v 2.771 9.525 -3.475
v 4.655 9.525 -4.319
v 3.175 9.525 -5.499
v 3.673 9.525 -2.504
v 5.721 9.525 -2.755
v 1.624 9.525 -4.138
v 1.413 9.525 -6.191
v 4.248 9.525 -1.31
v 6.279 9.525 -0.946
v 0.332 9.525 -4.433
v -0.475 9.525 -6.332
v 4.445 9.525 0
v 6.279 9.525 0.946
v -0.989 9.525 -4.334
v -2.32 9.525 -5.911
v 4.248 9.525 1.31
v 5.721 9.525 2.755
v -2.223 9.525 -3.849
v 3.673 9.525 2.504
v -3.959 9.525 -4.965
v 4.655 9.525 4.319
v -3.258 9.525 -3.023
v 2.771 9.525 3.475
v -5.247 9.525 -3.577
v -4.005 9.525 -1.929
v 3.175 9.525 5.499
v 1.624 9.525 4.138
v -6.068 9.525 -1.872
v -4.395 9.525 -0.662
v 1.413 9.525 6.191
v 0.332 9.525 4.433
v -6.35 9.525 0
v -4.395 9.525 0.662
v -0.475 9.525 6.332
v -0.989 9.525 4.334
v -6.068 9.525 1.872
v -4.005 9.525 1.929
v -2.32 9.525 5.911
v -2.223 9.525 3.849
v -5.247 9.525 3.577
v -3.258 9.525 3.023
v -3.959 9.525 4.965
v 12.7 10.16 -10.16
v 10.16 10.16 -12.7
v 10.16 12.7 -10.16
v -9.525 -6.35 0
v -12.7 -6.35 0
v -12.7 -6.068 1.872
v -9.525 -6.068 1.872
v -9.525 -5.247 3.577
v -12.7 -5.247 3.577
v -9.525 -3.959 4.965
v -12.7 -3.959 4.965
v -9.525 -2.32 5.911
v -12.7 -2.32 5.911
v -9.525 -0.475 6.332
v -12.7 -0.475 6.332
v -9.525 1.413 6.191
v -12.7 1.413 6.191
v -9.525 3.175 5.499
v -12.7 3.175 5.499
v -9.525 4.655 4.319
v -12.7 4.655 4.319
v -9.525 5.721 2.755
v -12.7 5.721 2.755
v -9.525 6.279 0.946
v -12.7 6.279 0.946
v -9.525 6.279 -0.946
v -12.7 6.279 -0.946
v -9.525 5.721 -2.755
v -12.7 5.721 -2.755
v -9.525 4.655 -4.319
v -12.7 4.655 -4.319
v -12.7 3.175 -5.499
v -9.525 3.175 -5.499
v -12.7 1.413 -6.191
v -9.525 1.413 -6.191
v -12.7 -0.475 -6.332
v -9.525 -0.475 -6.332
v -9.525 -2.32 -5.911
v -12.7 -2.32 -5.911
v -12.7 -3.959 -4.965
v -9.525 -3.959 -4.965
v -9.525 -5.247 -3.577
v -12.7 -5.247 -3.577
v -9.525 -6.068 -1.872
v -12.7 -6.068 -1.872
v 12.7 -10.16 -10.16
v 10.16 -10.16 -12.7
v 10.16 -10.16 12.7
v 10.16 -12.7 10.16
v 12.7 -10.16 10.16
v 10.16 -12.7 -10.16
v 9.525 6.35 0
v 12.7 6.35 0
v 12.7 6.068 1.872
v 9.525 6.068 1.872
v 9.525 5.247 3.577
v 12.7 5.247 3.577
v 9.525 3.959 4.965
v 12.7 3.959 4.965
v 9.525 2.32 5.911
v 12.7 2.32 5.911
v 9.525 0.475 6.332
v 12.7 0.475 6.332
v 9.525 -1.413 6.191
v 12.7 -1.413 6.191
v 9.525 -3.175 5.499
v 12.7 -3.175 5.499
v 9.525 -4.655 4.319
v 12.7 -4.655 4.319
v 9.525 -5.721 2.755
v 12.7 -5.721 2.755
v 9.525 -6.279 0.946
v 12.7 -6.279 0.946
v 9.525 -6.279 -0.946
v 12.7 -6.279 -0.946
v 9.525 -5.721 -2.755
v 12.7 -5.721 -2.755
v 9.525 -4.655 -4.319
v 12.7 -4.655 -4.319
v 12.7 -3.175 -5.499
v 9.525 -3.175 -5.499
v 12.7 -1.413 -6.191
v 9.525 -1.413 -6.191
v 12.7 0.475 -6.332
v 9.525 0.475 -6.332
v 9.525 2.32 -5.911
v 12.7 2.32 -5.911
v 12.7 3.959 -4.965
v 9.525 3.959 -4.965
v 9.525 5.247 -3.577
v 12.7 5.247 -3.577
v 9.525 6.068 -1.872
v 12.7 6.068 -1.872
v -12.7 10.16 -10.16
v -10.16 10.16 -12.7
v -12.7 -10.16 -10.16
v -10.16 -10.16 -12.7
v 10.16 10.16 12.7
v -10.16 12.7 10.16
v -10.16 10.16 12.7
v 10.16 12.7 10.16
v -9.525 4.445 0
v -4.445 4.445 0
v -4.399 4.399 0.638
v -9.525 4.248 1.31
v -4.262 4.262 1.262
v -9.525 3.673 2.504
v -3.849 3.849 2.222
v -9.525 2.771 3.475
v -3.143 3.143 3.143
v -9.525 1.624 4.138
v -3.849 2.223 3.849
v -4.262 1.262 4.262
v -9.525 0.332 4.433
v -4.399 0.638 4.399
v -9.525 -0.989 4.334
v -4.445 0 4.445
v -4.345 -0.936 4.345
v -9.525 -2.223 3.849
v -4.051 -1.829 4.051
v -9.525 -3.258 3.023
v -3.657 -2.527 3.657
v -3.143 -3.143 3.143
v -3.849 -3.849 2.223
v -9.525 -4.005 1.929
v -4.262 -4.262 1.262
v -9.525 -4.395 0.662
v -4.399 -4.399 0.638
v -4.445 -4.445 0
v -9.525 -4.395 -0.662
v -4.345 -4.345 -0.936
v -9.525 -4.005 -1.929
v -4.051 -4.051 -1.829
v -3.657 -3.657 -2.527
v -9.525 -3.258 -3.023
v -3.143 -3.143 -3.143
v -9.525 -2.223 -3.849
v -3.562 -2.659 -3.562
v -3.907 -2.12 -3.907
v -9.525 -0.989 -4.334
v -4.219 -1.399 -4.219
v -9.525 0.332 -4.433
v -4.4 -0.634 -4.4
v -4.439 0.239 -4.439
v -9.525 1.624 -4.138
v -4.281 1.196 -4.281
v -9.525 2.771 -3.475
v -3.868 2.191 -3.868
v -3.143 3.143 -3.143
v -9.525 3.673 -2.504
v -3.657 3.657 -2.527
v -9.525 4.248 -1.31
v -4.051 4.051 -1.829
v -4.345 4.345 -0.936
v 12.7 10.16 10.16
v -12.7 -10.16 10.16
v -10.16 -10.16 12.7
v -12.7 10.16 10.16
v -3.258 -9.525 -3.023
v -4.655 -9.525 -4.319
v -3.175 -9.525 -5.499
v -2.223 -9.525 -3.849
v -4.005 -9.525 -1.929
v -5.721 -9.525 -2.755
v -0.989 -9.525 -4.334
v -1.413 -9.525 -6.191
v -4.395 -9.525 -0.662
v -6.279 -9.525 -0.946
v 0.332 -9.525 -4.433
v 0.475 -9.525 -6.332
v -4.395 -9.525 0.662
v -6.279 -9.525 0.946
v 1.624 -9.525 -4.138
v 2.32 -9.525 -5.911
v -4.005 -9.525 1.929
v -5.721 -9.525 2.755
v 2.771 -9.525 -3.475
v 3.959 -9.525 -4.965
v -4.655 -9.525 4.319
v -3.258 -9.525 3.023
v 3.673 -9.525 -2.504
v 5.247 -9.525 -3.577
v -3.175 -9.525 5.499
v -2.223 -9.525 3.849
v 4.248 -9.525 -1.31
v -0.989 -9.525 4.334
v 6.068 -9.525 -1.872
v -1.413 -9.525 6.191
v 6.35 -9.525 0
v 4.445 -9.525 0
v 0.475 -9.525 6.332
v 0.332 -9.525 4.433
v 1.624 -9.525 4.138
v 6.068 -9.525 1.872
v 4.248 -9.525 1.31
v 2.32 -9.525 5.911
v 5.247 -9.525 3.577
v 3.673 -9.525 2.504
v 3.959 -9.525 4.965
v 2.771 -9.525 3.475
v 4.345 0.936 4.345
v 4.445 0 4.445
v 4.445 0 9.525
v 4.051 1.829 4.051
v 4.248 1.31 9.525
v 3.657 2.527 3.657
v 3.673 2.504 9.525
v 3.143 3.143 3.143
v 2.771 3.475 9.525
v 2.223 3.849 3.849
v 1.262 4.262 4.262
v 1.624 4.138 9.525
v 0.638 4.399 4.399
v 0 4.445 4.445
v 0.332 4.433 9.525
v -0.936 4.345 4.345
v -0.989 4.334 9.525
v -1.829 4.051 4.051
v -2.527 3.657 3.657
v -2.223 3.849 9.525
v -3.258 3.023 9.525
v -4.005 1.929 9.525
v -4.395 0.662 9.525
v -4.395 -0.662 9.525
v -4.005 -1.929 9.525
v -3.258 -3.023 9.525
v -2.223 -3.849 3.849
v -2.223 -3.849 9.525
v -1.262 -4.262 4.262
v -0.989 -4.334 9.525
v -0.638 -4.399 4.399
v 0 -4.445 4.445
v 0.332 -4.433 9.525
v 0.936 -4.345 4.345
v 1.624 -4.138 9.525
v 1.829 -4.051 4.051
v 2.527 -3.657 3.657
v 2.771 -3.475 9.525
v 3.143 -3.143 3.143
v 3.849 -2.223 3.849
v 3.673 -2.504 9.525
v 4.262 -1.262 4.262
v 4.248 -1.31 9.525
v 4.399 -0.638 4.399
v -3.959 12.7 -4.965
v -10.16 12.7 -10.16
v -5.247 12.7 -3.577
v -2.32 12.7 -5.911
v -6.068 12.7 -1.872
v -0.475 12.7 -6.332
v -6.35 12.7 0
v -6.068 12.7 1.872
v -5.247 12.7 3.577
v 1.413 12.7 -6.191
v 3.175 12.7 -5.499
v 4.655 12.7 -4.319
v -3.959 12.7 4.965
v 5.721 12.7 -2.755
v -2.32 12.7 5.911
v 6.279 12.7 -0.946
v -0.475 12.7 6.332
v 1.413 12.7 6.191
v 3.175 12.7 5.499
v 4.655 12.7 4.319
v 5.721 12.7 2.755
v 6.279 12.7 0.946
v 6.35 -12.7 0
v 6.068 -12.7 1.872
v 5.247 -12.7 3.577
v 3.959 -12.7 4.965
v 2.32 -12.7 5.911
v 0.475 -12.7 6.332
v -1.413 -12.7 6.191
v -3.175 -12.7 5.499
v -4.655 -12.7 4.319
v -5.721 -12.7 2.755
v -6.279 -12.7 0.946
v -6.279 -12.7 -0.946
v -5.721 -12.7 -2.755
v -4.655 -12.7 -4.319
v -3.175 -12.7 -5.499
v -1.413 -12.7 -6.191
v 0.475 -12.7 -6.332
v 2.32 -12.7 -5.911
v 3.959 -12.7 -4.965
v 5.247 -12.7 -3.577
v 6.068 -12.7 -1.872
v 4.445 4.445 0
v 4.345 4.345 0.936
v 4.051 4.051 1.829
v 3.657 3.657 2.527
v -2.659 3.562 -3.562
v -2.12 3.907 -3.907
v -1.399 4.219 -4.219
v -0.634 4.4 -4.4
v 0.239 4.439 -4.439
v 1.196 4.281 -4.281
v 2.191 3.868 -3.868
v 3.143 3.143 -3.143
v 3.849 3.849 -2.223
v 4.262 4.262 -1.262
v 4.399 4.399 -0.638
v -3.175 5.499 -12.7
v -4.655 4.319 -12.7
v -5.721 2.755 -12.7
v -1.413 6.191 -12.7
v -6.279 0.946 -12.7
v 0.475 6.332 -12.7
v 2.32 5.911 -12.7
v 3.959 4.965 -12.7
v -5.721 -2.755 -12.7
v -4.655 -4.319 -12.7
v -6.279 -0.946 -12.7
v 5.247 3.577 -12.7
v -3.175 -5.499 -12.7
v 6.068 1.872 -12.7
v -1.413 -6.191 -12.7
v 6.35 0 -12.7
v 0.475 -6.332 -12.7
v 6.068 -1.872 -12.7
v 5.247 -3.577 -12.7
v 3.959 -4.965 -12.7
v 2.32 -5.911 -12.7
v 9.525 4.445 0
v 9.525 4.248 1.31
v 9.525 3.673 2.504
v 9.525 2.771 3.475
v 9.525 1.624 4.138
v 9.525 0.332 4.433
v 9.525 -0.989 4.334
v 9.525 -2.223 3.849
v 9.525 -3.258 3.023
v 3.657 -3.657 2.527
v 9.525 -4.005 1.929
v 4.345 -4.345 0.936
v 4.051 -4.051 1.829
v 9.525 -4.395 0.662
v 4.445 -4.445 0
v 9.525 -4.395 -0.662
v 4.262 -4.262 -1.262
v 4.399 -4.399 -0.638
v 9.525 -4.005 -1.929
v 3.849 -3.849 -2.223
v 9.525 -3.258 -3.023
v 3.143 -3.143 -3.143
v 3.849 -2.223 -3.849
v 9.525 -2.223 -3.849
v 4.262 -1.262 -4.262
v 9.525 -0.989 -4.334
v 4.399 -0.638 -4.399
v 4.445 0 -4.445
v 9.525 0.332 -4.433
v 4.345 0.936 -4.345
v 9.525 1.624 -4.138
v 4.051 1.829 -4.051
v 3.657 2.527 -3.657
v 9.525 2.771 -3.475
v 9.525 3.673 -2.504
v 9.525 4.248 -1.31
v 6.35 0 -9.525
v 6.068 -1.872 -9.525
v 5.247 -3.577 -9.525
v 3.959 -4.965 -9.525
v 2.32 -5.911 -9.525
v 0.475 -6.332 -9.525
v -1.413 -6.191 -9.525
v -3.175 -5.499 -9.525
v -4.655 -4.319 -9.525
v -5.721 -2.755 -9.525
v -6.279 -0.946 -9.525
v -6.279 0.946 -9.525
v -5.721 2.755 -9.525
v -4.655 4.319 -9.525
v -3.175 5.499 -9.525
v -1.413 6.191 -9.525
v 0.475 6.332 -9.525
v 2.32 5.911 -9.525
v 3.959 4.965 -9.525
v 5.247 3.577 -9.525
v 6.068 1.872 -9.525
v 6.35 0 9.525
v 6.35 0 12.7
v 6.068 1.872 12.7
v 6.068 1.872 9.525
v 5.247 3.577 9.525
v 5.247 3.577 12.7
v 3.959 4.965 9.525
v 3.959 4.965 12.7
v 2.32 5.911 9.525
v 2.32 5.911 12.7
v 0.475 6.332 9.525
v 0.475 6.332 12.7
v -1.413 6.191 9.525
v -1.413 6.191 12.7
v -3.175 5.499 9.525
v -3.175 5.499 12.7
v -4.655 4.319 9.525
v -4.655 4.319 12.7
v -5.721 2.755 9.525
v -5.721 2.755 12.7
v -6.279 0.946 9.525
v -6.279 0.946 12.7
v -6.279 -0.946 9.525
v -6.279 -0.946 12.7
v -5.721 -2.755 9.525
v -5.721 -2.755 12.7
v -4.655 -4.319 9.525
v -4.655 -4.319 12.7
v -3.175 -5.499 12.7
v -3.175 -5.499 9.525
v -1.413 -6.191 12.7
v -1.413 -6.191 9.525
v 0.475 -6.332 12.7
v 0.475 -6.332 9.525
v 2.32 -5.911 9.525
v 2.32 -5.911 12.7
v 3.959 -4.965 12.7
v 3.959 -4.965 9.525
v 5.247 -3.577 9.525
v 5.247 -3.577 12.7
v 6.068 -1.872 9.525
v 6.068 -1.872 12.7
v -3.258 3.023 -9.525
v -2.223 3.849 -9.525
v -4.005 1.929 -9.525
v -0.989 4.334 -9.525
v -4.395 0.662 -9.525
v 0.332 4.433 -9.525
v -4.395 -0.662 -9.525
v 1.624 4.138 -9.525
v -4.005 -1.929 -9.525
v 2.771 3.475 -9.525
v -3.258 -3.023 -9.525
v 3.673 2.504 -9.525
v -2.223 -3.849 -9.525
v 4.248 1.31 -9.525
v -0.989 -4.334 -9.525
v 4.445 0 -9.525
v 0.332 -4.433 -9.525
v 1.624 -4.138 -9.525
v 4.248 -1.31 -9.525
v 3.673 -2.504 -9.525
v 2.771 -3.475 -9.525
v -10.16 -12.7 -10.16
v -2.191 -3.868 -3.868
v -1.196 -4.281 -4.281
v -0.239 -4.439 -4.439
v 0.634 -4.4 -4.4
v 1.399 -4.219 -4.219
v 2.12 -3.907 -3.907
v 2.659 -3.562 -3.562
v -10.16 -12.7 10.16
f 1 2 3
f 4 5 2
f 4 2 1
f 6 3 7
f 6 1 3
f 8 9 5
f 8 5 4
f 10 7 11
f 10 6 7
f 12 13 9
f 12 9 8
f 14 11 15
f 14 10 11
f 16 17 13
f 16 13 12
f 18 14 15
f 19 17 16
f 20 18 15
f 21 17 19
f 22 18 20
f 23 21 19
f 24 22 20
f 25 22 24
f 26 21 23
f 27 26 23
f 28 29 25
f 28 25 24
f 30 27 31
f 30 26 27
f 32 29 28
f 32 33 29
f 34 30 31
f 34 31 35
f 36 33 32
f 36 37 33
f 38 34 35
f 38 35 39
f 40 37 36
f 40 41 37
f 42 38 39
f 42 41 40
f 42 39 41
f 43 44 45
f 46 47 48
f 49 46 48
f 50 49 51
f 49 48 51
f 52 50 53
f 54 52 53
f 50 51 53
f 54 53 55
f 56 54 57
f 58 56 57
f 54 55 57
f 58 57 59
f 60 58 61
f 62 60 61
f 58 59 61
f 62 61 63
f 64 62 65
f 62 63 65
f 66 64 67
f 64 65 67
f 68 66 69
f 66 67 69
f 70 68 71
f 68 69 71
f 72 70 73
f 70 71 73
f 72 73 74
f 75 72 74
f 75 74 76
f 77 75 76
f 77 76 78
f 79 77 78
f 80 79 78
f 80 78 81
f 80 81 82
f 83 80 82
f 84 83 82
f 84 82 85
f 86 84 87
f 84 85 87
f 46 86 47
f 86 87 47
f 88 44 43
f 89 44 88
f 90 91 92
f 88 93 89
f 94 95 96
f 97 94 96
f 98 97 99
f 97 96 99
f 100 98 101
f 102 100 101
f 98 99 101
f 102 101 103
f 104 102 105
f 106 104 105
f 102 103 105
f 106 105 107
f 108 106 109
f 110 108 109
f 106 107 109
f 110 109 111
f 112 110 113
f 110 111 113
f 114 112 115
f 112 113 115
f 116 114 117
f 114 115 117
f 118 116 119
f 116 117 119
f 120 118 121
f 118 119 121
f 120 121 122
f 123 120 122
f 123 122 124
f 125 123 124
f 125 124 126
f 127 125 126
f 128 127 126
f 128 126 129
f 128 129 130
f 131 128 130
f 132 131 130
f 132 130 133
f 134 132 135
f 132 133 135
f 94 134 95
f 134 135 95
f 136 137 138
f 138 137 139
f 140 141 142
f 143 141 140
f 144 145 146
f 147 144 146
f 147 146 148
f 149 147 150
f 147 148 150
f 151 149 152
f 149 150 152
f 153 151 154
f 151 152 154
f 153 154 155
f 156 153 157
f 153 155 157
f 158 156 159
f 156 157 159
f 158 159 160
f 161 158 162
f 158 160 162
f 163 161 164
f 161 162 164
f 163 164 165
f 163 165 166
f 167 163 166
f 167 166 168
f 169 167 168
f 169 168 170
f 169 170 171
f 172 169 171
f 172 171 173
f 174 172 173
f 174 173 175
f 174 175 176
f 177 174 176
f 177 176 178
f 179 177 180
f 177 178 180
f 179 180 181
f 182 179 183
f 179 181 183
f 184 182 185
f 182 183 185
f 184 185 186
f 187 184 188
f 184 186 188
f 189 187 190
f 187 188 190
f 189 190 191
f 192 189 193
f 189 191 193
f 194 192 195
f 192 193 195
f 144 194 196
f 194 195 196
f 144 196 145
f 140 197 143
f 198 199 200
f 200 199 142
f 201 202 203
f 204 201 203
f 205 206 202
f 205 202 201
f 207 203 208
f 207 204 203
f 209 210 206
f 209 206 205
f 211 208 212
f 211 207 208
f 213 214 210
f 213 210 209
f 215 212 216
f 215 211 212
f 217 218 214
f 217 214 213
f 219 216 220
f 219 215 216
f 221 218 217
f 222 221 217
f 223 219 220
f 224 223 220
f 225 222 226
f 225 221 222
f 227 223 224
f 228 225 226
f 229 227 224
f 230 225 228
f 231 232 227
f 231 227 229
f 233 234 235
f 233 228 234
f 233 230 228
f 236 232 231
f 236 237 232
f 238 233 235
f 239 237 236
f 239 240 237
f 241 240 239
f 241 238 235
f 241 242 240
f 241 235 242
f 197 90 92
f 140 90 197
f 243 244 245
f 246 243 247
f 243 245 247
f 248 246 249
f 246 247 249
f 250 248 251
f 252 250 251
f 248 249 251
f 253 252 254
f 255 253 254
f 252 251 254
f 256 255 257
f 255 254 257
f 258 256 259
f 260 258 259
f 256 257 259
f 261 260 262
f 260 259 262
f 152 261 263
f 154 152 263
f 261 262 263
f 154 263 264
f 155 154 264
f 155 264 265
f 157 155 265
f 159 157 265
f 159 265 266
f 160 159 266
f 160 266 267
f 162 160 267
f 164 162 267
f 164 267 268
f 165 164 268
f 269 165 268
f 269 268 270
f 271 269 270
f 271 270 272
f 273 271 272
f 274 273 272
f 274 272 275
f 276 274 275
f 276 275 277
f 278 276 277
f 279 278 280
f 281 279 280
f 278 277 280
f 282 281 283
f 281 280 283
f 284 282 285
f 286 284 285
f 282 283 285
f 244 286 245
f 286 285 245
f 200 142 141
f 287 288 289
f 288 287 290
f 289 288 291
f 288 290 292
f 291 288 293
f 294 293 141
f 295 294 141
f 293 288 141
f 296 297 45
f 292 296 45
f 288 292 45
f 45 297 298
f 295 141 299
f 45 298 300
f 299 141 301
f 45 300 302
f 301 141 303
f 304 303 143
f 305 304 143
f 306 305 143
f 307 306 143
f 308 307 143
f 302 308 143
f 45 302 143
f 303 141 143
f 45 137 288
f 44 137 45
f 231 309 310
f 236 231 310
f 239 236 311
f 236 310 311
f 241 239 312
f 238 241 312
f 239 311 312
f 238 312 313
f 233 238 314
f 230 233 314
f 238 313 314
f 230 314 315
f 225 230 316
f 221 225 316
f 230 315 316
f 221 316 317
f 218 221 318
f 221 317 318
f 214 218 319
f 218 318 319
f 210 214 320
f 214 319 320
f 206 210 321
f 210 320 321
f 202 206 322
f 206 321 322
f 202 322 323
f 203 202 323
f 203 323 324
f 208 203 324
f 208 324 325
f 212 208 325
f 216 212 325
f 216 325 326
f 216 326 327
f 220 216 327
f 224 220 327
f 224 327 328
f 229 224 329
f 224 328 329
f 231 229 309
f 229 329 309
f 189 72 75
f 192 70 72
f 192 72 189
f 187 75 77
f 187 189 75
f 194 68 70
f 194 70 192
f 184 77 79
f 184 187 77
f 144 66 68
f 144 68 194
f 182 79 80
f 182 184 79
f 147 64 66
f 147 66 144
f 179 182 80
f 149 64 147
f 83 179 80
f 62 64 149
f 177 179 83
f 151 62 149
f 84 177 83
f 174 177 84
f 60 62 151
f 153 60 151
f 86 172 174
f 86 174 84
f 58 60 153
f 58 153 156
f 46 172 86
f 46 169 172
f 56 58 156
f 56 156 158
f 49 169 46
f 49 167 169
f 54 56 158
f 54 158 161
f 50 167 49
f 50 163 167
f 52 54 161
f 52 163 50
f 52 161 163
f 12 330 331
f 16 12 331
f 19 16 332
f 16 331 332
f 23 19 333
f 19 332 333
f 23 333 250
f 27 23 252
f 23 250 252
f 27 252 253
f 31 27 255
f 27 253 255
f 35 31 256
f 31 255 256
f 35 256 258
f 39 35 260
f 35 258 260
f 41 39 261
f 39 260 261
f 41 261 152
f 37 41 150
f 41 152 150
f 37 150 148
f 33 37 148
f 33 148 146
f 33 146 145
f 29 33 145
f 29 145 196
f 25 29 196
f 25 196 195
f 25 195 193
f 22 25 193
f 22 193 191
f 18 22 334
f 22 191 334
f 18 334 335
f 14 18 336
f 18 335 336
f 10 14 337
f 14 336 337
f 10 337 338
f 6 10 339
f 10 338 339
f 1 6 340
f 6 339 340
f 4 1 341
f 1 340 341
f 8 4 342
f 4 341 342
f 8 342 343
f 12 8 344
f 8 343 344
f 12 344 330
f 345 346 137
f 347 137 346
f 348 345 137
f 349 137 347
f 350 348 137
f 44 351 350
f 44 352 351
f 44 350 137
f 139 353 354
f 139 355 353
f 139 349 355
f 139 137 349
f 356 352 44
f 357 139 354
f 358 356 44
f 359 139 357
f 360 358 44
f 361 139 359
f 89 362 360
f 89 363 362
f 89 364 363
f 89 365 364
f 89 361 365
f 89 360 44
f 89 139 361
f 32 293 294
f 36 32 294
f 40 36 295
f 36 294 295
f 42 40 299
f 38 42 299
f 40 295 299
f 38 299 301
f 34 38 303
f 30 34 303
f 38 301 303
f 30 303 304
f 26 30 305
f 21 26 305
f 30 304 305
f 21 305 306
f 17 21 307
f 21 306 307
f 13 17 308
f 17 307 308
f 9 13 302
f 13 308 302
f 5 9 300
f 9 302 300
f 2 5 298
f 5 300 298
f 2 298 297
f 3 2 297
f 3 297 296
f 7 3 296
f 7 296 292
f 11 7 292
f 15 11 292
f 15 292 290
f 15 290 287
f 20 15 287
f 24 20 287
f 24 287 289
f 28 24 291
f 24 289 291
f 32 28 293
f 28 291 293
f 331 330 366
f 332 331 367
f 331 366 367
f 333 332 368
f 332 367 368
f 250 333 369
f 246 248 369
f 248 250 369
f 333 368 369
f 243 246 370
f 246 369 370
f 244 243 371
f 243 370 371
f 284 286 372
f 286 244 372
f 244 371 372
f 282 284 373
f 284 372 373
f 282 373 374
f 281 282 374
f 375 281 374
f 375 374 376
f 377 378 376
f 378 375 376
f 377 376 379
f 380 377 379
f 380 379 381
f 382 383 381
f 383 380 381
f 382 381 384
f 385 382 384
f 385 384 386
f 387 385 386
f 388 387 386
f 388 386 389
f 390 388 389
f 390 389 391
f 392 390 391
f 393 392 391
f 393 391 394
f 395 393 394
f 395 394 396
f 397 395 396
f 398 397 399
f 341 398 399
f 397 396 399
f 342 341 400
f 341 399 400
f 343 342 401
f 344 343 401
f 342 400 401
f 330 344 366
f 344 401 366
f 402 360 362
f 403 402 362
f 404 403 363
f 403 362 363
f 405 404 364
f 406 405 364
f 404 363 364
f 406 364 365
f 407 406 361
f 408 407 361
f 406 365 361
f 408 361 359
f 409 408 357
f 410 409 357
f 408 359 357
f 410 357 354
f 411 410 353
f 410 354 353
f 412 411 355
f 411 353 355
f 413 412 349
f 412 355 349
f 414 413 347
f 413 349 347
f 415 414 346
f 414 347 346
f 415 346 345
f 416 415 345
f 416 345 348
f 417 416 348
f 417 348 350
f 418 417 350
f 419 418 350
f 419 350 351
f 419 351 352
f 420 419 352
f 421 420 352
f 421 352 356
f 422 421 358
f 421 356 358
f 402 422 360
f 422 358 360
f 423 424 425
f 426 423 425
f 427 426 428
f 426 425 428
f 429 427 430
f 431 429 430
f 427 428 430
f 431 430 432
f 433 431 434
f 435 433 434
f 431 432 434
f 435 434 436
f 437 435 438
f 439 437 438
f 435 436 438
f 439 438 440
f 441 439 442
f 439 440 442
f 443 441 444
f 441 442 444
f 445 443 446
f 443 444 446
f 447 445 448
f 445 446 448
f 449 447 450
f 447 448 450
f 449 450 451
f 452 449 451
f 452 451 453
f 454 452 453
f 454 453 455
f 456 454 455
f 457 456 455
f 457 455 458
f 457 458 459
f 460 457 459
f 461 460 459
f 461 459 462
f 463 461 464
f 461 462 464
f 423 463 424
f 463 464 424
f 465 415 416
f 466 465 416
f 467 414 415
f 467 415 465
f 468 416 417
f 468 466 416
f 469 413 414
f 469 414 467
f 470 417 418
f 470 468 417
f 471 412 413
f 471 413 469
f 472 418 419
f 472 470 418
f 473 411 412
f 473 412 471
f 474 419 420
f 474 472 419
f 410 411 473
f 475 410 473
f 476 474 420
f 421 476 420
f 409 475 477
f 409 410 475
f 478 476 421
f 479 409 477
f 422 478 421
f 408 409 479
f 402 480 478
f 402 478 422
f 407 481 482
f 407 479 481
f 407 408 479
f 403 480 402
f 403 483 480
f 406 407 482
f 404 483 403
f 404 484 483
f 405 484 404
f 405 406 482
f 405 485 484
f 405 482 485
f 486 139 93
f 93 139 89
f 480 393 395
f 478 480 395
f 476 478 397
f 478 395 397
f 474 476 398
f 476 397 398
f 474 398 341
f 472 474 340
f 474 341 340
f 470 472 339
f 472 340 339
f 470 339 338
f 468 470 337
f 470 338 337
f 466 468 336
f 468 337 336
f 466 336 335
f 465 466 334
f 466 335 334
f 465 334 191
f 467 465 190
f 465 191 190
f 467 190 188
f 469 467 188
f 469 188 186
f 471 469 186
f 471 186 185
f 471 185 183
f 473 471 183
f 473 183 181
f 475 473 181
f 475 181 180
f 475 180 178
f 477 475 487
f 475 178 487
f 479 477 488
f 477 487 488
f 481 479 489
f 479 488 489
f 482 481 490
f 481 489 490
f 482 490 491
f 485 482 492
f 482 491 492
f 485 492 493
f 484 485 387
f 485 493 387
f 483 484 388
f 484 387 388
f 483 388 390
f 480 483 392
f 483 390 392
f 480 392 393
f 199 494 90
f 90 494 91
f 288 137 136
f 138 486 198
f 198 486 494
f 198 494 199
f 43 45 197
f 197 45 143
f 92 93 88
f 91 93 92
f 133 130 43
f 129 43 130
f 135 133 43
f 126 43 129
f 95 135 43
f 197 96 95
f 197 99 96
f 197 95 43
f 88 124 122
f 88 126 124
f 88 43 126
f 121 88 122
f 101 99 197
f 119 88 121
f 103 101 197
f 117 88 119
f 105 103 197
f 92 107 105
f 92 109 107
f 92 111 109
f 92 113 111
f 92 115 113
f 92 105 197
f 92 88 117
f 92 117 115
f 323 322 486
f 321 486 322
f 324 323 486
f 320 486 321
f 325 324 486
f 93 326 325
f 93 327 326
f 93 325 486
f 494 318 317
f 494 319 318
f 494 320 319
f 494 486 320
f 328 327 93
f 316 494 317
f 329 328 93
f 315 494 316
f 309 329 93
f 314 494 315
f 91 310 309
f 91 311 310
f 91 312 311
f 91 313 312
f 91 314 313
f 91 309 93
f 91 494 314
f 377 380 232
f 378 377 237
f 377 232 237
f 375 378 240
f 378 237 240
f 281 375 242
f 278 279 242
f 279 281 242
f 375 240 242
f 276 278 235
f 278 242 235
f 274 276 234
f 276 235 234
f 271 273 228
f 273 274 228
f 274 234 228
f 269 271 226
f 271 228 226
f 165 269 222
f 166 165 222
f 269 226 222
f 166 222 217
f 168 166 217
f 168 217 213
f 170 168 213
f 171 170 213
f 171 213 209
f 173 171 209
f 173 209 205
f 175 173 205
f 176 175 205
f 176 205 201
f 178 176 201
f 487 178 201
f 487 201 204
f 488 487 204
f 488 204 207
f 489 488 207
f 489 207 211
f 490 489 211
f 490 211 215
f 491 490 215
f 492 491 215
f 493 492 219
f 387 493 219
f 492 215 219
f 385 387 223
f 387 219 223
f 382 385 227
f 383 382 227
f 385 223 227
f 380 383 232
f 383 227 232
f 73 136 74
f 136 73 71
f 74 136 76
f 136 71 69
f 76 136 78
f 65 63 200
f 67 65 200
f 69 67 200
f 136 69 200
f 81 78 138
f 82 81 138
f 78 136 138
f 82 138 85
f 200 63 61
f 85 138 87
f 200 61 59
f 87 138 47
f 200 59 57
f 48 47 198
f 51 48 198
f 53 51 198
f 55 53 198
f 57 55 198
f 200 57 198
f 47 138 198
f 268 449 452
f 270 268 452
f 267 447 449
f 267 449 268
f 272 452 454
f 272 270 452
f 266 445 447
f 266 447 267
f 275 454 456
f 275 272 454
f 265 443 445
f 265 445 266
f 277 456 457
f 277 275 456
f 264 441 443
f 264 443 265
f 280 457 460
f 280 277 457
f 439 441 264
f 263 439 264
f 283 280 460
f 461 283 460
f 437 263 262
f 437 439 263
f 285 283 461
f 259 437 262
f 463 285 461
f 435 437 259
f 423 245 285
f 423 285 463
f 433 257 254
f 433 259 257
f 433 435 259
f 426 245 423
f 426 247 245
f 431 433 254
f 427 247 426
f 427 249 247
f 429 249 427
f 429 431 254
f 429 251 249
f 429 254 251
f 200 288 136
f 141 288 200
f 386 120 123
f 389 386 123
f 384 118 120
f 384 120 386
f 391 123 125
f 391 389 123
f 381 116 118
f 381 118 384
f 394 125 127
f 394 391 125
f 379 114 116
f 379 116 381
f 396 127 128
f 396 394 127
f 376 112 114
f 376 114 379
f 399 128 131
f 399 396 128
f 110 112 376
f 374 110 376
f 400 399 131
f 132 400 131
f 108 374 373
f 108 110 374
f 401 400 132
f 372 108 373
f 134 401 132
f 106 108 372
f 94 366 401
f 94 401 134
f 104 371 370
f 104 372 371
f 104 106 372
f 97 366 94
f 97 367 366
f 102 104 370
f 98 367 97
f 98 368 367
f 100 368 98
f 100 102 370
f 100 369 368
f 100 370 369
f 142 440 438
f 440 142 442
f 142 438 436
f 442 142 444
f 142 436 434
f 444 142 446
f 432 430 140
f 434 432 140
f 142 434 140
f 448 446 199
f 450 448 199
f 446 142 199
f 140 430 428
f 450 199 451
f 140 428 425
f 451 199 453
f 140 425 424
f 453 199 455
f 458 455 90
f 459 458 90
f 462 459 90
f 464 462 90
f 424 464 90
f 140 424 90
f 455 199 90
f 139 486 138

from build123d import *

# Parameters (mm, degrees)
F0_W          = 25.4
F0_H          = 25.4
F1_DEPTH      = 12.7
F1_DEPTH_BACK = 12.7
F2_R          = 4.445
F8_DEPTH      = 25.4
F4_R          = 4.445
F9_DEPTH      = 25.4
F6_R          = 4.445
F10_DEPTH     = 25.4
F2_R_2        = 6.35
F11_DEPTH     = 3.175
F3_R          = 6.35
F3_R_2        = 4.445
F12_DEPTH     = 3.175
F4_R_2        = 6.35
F13_DEPTH     = 3.175
F5_R          = 6.35
F5_R_2        = 4.445
F14_DEPTH     = 3.175
F6_R_2        = 6.35
F15_DEPTH     = 3.175
F7_R          = 6.35
F7_R_2        = 4.445
F16_DEPTH     = 3.175
F17_SIZE      = 2.54


with BuildPart() as f1:
    # F0 (on Front) → F1 (new body, two sides)
    with BuildSketch(Plane.XZ) as f1_sk:
        Rectangle(F0_W, F0_H)
    extrude(amount=F1_DEPTH)
    extrude(f1_sk.sketch, amount=-F1_DEPTH_BACK)

    # F2 (on face) → F8 (cut)
    with BuildSketch(Plane.XY.offset(12.7)):
        Circle(F2_R)
    extrude(amount=-F8_DEPTH, mode=Mode.SUBTRACT)

    # F4 (on face) → F9 (cut)
    with BuildSketch(Plane.XZ.offset(12.7)):
        Circle(F4_R)
    extrude(amount=-F9_DEPTH, mode=Mode.SUBTRACT)

    # F6 (on face) → F10 (cut)
    with BuildSketch(Plane.YZ.offset(12.7)):
        Circle(F6_R)
    extrude(amount=-F10_DEPTH, mode=Mode.SUBTRACT)

    # F2 (on face) → F11 (cut)
    with BuildSketch(Plane.XY.offset(12.7)):
        Circle(F2_R_2)
        Circle(F2_R, mode=Mode.SUBTRACT)
    extrude(amount=-F11_DEPTH, mode=Mode.SUBTRACT)

    # F3 (on face) → F12 (cut)
    with BuildSketch(Plane(origin=(0, 0, -12.7), x_dir=(1, 0, 0), z_dir=(0, 0, -1))):
        Circle(F3_R)
        Circle(F3_R_2, mode=Mode.SUBTRACT)
    extrude(amount=-F12_DEPTH, mode=Mode.SUBTRACT)

    # F4 (on face) → F13 (cut)
    with BuildSketch(Plane.XZ.offset(12.7)):
        Circle(F4_R_2)
        Circle(F4_R, mode=Mode.SUBTRACT)
    extrude(amount=-F13_DEPTH, mode=Mode.SUBTRACT)

    # F5 (on face) → F14 (cut)
    with BuildSketch(Plane(origin=(0, 12.7, 0), x_dir=(-1, 0, 0), z_dir=(0, 1, 0))):
        Circle(F5_R)
        Circle(F5_R_2, mode=Mode.SUBTRACT)
    extrude(amount=-F14_DEPTH, mode=Mode.SUBTRACT)

    # F6 (on face) → F15 (cut)
    with BuildSketch(Plane.YZ.offset(12.7)):
        Circle(F6_R_2)
        Circle(F6_R, mode=Mode.SUBTRACT)
    extrude(amount=-F15_DEPTH, mode=Mode.SUBTRACT)

    # F7 (on face) → F16 (cut)
    with BuildSketch(Plane(origin=(-12.7, 0, 0), x_dir=(0, -1, 0), z_dir=(-1, 0, 0))):
        Circle(F7_R)
        Circle(F7_R_2, mode=Mode.SUBTRACT)
    extrude(amount=-F16_DEPTH, mode=Mode.SUBTRACT)

    # F17
    f17_edges = [f1.edges().sort_by_distance(p)[0] for p in [
        (12.7, -12.7, 0),
        (0, -12.7, -12.7),
        (-12.7, -12.7, 0),
        (0, -12.7, 12.7),
        (12.7, 0, -12.7),
        (-12.7, 0, -12.7),
        (0, 12.7, -12.7),
        (12.7, 12.7, 0),
        (12.7, 0, 12.7),
        (0, 12.7, 12.7),
        (-12.7, 0, 12.7),
        (-12.7, 12.7, 0),
    ]]
    chamfer(f17_edges, length=F17_SIZE)


solid = f1.part
